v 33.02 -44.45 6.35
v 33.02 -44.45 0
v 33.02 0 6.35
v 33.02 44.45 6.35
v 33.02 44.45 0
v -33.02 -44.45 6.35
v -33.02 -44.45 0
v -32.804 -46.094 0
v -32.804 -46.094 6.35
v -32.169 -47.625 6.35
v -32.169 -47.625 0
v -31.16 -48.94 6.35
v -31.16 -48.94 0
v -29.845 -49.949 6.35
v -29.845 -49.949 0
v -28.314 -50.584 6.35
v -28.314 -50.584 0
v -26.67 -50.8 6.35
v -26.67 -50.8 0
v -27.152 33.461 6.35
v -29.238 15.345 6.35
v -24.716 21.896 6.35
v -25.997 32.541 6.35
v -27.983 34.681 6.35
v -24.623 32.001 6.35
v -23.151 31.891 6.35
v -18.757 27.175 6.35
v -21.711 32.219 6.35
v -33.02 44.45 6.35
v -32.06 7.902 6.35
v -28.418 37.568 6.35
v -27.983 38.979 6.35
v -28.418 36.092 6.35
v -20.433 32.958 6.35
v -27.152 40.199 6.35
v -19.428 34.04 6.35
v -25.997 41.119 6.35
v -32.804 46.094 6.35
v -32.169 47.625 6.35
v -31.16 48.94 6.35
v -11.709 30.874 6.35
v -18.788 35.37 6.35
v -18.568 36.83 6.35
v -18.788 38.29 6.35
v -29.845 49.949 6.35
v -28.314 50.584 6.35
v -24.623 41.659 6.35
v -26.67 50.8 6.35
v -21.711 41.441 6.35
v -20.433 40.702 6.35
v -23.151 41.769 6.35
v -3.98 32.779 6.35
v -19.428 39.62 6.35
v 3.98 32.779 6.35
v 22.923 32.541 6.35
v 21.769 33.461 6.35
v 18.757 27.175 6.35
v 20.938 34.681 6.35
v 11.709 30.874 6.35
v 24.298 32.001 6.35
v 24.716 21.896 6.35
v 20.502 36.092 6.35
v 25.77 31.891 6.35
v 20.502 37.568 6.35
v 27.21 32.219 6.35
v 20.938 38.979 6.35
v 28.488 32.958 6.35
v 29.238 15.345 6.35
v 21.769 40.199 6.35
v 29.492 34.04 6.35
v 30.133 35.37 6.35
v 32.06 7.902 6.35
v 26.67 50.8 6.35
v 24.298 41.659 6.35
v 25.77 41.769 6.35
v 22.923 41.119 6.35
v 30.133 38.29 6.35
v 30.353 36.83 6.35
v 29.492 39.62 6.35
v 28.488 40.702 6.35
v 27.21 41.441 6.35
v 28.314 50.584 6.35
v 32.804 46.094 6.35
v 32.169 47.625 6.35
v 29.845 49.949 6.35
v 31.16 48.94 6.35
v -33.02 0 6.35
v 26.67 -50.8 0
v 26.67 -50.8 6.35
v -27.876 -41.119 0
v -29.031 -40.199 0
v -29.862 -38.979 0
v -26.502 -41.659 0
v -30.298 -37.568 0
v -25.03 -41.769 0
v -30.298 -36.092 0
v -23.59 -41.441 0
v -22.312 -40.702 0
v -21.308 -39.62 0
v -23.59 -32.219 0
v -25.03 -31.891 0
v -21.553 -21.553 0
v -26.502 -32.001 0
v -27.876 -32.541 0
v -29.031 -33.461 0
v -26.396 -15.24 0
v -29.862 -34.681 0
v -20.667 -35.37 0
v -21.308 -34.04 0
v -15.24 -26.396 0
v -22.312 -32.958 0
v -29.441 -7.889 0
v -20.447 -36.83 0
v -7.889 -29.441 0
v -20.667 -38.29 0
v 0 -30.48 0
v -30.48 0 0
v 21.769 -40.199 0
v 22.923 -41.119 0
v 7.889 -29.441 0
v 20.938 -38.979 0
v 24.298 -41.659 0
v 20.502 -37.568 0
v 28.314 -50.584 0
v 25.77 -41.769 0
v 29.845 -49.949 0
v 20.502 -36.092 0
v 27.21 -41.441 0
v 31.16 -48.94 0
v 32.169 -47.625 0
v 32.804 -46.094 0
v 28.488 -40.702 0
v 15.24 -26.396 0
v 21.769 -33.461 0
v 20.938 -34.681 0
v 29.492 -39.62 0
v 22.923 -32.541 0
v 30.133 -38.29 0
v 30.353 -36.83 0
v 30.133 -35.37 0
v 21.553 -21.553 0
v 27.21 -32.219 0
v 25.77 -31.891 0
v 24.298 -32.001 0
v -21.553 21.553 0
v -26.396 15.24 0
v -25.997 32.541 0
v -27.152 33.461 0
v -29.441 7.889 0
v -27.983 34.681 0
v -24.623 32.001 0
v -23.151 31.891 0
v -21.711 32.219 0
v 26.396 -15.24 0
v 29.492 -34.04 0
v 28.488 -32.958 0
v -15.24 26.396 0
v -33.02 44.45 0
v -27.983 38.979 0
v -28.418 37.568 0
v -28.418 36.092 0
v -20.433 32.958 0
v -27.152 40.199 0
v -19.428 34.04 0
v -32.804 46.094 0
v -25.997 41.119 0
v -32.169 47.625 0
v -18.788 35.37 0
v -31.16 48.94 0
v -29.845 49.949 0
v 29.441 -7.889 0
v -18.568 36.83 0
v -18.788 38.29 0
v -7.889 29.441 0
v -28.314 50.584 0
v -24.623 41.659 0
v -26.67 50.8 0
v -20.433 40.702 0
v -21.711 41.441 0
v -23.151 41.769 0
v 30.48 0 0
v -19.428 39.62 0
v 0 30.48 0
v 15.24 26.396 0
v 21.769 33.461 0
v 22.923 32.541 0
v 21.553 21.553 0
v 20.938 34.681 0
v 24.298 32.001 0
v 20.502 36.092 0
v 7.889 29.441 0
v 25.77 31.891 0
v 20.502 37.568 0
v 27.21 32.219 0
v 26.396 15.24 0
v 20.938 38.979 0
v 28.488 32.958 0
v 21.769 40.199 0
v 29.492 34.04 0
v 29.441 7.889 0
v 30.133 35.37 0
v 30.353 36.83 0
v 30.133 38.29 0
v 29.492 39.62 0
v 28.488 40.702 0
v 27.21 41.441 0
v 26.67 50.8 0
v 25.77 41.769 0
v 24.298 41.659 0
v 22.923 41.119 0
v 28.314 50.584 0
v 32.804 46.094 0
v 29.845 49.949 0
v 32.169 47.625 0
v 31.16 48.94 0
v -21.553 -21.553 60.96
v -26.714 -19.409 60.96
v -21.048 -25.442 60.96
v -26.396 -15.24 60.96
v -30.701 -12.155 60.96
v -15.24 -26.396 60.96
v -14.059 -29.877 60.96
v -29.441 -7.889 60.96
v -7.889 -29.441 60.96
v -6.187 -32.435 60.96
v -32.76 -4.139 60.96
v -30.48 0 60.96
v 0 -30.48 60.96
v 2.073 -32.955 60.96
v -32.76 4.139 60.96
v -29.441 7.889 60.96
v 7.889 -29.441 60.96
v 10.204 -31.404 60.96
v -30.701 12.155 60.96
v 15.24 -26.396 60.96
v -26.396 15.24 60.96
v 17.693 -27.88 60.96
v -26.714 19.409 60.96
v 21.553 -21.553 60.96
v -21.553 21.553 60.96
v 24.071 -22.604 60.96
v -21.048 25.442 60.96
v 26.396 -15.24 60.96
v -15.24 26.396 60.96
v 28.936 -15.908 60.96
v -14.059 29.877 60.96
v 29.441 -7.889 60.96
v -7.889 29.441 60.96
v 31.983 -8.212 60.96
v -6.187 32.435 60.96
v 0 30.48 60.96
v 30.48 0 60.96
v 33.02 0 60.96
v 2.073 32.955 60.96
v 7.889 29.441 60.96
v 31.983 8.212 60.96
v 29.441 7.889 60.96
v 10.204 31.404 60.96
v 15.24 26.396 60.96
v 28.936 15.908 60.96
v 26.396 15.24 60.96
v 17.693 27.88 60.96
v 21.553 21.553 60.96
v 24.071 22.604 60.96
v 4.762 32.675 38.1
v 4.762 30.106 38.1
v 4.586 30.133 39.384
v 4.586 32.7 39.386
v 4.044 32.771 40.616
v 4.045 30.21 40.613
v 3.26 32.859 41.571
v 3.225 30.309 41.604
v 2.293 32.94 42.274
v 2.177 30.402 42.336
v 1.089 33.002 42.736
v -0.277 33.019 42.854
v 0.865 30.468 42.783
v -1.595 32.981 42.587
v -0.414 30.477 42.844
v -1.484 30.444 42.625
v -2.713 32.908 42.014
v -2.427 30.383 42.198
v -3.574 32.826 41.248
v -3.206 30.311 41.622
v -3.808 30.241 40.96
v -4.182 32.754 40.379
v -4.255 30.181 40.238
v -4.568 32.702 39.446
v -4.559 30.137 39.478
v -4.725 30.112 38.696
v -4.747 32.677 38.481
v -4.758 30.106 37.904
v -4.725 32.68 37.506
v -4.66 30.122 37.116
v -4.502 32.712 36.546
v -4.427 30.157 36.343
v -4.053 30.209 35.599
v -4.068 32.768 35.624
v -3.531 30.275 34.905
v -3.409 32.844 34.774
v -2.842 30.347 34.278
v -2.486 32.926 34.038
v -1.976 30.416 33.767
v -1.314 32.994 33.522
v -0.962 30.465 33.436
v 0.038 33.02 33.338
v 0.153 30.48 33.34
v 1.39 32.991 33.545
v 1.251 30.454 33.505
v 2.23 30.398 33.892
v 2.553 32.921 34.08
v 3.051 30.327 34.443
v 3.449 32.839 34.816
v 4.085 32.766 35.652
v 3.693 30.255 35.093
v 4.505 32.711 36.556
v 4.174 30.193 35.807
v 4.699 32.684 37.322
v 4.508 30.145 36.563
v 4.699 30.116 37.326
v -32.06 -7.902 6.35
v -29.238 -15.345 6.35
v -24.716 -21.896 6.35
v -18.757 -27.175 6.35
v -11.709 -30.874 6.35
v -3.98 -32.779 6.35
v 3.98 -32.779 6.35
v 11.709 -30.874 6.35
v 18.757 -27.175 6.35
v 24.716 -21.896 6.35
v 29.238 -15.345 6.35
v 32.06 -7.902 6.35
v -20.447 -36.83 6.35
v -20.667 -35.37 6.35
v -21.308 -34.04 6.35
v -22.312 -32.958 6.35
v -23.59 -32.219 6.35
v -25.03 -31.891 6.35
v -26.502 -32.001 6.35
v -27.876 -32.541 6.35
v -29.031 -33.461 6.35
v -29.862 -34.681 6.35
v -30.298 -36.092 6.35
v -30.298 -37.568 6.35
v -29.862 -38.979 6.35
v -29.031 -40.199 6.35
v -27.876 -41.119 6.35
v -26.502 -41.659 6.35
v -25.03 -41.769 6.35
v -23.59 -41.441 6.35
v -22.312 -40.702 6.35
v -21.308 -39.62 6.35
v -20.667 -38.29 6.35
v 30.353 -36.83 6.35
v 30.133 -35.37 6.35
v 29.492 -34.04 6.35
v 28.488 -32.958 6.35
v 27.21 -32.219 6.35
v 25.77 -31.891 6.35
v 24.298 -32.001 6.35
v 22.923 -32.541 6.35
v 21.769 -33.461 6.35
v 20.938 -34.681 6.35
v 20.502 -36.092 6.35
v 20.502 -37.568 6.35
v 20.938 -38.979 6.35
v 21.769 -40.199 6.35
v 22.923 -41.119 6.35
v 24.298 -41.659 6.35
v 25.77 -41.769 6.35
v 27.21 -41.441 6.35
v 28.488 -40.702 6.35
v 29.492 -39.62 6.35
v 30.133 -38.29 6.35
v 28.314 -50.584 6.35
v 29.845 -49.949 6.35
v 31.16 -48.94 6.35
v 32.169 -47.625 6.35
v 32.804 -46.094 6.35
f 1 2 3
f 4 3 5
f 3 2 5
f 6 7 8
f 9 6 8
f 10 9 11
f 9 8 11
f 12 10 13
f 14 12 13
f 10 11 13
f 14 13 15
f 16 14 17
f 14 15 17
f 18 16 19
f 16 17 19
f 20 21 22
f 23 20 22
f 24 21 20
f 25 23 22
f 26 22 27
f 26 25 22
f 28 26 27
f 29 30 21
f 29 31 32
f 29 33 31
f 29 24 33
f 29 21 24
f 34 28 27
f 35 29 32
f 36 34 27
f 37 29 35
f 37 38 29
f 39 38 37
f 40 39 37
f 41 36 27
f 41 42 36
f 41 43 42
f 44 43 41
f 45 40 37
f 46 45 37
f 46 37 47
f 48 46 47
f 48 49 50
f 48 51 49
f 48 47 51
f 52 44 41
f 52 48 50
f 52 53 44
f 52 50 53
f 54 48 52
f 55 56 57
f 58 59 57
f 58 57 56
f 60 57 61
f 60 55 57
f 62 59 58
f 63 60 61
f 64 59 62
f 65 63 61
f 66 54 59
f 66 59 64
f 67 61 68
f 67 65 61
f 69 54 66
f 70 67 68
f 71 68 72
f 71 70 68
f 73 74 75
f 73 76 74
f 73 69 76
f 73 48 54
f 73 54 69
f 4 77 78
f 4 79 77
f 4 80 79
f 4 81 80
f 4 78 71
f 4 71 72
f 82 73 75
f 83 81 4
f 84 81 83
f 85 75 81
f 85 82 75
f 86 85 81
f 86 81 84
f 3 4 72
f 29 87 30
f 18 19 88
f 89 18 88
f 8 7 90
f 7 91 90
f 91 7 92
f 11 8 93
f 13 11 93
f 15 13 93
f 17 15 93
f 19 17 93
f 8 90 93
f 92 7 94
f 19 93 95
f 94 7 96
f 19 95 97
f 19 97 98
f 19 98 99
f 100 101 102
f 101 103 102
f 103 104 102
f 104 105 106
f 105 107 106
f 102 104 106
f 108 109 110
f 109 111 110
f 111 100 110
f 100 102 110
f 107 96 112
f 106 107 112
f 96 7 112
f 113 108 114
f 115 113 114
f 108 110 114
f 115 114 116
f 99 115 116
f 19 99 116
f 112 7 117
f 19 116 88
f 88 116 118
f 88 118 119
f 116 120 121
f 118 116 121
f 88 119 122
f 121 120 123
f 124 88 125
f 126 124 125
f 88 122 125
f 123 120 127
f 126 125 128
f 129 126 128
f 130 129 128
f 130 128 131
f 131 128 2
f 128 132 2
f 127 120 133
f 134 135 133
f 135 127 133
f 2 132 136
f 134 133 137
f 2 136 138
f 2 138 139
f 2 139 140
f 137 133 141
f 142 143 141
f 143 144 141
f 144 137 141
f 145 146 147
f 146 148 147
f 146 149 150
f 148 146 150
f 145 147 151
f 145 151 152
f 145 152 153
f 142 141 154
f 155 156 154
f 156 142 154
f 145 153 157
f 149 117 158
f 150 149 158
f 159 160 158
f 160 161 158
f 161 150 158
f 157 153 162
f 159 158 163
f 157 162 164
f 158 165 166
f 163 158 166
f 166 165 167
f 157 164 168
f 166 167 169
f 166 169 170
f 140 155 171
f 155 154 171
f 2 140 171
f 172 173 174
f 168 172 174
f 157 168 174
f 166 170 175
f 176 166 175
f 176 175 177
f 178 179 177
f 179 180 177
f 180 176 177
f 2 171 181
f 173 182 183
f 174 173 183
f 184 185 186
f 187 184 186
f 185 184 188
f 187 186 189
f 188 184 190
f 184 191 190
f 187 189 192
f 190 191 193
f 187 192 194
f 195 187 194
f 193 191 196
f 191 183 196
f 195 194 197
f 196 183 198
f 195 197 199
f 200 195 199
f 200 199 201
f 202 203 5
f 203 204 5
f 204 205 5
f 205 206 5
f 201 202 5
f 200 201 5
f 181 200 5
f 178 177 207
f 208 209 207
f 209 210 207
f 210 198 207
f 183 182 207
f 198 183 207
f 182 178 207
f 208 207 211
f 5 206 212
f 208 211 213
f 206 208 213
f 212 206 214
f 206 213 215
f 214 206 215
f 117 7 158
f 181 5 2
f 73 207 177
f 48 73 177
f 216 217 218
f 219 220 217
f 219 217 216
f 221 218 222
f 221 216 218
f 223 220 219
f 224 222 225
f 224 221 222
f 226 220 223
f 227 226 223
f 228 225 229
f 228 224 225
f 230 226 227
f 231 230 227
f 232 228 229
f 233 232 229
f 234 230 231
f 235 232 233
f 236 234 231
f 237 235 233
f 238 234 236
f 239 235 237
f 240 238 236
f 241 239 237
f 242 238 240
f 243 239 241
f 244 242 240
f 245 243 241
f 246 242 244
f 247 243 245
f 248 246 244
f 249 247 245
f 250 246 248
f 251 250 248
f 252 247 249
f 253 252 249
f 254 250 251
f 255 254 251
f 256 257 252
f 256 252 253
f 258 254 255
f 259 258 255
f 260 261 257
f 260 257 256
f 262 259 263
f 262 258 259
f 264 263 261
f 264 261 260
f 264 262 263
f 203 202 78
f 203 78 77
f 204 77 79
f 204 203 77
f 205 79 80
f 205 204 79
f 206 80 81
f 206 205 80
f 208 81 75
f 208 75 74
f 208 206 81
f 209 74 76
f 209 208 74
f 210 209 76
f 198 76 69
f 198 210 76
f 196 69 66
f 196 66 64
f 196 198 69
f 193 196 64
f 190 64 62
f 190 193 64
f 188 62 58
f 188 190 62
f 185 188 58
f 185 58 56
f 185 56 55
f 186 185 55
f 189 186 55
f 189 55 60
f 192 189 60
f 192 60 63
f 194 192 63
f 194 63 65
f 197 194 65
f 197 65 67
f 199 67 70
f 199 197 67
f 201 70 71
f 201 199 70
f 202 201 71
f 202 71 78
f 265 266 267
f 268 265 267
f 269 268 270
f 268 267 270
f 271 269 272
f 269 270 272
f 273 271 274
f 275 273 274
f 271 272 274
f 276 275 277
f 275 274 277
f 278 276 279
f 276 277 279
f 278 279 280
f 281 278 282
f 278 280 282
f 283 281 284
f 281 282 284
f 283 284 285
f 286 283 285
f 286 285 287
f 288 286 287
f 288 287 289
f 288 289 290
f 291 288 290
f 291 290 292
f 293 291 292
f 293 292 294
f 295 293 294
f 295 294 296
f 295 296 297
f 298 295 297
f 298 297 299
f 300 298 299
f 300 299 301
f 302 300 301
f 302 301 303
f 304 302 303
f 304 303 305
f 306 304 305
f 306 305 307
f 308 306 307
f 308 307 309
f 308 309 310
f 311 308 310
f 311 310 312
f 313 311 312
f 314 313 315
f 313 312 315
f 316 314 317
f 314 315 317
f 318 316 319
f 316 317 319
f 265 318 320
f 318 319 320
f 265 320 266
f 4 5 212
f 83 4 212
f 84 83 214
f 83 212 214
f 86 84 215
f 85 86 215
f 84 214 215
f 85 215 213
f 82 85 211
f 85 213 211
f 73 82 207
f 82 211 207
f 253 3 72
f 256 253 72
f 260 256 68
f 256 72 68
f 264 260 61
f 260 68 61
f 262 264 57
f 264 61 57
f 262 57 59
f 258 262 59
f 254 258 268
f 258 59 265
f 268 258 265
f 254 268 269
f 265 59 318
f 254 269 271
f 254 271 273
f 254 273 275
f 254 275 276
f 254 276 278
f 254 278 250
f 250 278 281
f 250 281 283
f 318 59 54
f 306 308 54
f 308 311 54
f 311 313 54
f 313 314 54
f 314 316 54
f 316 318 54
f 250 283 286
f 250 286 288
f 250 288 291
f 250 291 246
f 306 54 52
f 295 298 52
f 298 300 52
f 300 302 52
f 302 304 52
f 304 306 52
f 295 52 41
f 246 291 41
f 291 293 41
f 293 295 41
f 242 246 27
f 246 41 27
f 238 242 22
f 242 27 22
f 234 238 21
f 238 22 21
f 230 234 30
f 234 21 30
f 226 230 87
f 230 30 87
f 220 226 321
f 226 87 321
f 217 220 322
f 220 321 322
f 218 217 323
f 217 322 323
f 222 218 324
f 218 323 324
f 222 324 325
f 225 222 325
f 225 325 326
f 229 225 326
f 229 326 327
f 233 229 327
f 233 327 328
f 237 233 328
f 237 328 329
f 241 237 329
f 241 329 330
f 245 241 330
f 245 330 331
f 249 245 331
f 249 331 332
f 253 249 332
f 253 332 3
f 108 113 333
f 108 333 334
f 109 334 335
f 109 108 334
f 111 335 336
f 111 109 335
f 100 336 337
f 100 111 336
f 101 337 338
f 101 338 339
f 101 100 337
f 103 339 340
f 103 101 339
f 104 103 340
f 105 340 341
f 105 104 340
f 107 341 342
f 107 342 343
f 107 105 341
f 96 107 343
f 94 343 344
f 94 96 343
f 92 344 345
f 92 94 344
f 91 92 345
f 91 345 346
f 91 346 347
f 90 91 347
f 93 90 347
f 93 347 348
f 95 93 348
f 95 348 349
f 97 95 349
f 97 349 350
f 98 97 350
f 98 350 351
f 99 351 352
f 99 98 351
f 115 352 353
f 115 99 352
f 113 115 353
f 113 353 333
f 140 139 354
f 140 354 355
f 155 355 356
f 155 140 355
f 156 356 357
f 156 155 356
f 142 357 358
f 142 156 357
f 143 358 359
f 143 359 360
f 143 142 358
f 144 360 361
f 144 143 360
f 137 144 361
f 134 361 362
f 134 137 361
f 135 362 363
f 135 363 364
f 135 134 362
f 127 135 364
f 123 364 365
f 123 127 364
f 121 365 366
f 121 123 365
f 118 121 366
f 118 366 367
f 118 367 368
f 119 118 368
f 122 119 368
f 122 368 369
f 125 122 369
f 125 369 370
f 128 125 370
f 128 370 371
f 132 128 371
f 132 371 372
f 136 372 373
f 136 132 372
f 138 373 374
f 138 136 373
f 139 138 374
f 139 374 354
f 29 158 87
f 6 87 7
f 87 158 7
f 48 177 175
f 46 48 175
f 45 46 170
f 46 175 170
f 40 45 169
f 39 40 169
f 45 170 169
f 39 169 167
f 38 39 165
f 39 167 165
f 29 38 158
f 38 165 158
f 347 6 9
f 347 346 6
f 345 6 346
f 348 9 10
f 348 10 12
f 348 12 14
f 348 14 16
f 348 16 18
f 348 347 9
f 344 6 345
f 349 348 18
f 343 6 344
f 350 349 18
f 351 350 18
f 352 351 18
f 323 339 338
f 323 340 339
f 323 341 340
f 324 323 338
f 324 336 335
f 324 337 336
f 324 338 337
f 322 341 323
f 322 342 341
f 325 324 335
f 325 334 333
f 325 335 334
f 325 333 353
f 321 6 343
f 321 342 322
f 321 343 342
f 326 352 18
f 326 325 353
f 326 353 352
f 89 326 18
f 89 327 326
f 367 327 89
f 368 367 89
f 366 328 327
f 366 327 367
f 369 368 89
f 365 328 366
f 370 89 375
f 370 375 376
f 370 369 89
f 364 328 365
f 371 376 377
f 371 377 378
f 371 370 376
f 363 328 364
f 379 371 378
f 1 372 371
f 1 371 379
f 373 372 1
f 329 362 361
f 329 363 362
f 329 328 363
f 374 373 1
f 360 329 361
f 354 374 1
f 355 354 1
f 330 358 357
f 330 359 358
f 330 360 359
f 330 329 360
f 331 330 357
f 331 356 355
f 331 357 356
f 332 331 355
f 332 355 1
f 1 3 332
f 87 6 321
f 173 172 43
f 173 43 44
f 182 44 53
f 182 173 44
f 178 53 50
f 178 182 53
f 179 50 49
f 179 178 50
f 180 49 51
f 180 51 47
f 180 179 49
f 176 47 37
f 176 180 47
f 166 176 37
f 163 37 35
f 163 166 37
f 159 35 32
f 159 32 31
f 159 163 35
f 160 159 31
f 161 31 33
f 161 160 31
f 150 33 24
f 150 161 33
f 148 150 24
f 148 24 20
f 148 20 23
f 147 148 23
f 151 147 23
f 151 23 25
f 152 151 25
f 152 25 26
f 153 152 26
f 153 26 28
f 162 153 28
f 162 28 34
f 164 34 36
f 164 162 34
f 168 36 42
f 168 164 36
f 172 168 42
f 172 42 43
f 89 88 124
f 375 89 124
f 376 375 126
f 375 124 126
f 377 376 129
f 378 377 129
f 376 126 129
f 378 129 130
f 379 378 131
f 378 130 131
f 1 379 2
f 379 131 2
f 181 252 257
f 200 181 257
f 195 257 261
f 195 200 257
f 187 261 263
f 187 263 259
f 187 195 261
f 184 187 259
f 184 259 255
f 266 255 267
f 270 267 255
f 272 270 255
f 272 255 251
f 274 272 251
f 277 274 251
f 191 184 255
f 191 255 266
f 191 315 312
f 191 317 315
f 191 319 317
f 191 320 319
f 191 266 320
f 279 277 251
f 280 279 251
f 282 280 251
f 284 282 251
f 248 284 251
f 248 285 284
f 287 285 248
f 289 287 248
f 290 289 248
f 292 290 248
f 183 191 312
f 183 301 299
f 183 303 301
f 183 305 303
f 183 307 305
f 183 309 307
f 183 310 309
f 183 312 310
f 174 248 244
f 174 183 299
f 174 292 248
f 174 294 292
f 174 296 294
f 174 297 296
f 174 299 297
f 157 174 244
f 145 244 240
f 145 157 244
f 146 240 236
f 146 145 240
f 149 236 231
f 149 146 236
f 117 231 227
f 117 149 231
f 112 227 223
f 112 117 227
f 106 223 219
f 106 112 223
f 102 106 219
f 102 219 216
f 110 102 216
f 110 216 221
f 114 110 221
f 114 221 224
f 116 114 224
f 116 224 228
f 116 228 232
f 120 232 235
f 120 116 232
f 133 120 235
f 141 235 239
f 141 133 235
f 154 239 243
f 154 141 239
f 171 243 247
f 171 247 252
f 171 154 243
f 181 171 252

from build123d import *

# Parameters (mm, degrees)
F0_R     = 4.953
F0_R_2   = 30.48
F1_DEPTH = 6.35
F2_R     = 33.02
F2_R_2   = 30.48
F3_DEPTH = 54.61
F5_D     = 9.525
F5_DEPTH = 50.801


with BuildPart() as f1:
    # F0 (on Top) → F1 (new body)
    with BuildSketch(Plane.XY):
        with BuildLine():
            ThreePointArc((33.02, 44.45), (31.1601280605, 48.9401280605), (26.67, 50.8))
            Line((26.67, 50.8), (-26.67, 50.8))
            ThreePointArc((-26.67, 50.8), (-31.1601280605, 48.9401280605), (-33.02, 44.45))
            Line((-33.02, 44.45), (-33.02, -44.45))
            ThreePointArc((-33.02, -44.45), (-31.1601280605, -48.9401280605), (-26.67, -50.8))
            Line((-26.67, -50.8), (26.67, -50.8))
            ThreePointArc((26.67, -50.8), (31.1601280605, -48.9401280605), (33.02, -44.45))
            Line((33.02, -44.45), (33.02, 44.45))
        make_face()
        with Locations((-25.4, -36.83)):
            Circle(F0_R, mode=Mode.SUBTRACT)
        with Locations((25.4, -36.83)):
            Circle(F0_R, mode=Mode.SUBTRACT)
        Circle(F0_R_2, mode=Mode.SUBTRACT)
        with Locations((-23.5207291554, 36.83)):
            Circle(F0_R, mode=Mode.SUBTRACT)
        with Locations((25.4, 36.83)):
            Circle(F0_R, mode=Mode.SUBTRACT)
    extrude(amount=F1_DEPTH)

    # F2 (on face) → F3 (join)
    with BuildSketch(Plane.XY.offset(6.35)):
        Circle(F2_R)
        Circle(F2_R_2, mode=Mode.SUBTRACT)
    extrude(amount=F3_DEPTH)

    # F5 (through all, one way)
    with BuildSketch(Plane.XZ):
        with Locations((0, 38.1)):
            Circle(F5_D / 2)
    extrude(amount=-F5_DEPTH, mode=Mode.SUBTRACT)


solid = f1.part
